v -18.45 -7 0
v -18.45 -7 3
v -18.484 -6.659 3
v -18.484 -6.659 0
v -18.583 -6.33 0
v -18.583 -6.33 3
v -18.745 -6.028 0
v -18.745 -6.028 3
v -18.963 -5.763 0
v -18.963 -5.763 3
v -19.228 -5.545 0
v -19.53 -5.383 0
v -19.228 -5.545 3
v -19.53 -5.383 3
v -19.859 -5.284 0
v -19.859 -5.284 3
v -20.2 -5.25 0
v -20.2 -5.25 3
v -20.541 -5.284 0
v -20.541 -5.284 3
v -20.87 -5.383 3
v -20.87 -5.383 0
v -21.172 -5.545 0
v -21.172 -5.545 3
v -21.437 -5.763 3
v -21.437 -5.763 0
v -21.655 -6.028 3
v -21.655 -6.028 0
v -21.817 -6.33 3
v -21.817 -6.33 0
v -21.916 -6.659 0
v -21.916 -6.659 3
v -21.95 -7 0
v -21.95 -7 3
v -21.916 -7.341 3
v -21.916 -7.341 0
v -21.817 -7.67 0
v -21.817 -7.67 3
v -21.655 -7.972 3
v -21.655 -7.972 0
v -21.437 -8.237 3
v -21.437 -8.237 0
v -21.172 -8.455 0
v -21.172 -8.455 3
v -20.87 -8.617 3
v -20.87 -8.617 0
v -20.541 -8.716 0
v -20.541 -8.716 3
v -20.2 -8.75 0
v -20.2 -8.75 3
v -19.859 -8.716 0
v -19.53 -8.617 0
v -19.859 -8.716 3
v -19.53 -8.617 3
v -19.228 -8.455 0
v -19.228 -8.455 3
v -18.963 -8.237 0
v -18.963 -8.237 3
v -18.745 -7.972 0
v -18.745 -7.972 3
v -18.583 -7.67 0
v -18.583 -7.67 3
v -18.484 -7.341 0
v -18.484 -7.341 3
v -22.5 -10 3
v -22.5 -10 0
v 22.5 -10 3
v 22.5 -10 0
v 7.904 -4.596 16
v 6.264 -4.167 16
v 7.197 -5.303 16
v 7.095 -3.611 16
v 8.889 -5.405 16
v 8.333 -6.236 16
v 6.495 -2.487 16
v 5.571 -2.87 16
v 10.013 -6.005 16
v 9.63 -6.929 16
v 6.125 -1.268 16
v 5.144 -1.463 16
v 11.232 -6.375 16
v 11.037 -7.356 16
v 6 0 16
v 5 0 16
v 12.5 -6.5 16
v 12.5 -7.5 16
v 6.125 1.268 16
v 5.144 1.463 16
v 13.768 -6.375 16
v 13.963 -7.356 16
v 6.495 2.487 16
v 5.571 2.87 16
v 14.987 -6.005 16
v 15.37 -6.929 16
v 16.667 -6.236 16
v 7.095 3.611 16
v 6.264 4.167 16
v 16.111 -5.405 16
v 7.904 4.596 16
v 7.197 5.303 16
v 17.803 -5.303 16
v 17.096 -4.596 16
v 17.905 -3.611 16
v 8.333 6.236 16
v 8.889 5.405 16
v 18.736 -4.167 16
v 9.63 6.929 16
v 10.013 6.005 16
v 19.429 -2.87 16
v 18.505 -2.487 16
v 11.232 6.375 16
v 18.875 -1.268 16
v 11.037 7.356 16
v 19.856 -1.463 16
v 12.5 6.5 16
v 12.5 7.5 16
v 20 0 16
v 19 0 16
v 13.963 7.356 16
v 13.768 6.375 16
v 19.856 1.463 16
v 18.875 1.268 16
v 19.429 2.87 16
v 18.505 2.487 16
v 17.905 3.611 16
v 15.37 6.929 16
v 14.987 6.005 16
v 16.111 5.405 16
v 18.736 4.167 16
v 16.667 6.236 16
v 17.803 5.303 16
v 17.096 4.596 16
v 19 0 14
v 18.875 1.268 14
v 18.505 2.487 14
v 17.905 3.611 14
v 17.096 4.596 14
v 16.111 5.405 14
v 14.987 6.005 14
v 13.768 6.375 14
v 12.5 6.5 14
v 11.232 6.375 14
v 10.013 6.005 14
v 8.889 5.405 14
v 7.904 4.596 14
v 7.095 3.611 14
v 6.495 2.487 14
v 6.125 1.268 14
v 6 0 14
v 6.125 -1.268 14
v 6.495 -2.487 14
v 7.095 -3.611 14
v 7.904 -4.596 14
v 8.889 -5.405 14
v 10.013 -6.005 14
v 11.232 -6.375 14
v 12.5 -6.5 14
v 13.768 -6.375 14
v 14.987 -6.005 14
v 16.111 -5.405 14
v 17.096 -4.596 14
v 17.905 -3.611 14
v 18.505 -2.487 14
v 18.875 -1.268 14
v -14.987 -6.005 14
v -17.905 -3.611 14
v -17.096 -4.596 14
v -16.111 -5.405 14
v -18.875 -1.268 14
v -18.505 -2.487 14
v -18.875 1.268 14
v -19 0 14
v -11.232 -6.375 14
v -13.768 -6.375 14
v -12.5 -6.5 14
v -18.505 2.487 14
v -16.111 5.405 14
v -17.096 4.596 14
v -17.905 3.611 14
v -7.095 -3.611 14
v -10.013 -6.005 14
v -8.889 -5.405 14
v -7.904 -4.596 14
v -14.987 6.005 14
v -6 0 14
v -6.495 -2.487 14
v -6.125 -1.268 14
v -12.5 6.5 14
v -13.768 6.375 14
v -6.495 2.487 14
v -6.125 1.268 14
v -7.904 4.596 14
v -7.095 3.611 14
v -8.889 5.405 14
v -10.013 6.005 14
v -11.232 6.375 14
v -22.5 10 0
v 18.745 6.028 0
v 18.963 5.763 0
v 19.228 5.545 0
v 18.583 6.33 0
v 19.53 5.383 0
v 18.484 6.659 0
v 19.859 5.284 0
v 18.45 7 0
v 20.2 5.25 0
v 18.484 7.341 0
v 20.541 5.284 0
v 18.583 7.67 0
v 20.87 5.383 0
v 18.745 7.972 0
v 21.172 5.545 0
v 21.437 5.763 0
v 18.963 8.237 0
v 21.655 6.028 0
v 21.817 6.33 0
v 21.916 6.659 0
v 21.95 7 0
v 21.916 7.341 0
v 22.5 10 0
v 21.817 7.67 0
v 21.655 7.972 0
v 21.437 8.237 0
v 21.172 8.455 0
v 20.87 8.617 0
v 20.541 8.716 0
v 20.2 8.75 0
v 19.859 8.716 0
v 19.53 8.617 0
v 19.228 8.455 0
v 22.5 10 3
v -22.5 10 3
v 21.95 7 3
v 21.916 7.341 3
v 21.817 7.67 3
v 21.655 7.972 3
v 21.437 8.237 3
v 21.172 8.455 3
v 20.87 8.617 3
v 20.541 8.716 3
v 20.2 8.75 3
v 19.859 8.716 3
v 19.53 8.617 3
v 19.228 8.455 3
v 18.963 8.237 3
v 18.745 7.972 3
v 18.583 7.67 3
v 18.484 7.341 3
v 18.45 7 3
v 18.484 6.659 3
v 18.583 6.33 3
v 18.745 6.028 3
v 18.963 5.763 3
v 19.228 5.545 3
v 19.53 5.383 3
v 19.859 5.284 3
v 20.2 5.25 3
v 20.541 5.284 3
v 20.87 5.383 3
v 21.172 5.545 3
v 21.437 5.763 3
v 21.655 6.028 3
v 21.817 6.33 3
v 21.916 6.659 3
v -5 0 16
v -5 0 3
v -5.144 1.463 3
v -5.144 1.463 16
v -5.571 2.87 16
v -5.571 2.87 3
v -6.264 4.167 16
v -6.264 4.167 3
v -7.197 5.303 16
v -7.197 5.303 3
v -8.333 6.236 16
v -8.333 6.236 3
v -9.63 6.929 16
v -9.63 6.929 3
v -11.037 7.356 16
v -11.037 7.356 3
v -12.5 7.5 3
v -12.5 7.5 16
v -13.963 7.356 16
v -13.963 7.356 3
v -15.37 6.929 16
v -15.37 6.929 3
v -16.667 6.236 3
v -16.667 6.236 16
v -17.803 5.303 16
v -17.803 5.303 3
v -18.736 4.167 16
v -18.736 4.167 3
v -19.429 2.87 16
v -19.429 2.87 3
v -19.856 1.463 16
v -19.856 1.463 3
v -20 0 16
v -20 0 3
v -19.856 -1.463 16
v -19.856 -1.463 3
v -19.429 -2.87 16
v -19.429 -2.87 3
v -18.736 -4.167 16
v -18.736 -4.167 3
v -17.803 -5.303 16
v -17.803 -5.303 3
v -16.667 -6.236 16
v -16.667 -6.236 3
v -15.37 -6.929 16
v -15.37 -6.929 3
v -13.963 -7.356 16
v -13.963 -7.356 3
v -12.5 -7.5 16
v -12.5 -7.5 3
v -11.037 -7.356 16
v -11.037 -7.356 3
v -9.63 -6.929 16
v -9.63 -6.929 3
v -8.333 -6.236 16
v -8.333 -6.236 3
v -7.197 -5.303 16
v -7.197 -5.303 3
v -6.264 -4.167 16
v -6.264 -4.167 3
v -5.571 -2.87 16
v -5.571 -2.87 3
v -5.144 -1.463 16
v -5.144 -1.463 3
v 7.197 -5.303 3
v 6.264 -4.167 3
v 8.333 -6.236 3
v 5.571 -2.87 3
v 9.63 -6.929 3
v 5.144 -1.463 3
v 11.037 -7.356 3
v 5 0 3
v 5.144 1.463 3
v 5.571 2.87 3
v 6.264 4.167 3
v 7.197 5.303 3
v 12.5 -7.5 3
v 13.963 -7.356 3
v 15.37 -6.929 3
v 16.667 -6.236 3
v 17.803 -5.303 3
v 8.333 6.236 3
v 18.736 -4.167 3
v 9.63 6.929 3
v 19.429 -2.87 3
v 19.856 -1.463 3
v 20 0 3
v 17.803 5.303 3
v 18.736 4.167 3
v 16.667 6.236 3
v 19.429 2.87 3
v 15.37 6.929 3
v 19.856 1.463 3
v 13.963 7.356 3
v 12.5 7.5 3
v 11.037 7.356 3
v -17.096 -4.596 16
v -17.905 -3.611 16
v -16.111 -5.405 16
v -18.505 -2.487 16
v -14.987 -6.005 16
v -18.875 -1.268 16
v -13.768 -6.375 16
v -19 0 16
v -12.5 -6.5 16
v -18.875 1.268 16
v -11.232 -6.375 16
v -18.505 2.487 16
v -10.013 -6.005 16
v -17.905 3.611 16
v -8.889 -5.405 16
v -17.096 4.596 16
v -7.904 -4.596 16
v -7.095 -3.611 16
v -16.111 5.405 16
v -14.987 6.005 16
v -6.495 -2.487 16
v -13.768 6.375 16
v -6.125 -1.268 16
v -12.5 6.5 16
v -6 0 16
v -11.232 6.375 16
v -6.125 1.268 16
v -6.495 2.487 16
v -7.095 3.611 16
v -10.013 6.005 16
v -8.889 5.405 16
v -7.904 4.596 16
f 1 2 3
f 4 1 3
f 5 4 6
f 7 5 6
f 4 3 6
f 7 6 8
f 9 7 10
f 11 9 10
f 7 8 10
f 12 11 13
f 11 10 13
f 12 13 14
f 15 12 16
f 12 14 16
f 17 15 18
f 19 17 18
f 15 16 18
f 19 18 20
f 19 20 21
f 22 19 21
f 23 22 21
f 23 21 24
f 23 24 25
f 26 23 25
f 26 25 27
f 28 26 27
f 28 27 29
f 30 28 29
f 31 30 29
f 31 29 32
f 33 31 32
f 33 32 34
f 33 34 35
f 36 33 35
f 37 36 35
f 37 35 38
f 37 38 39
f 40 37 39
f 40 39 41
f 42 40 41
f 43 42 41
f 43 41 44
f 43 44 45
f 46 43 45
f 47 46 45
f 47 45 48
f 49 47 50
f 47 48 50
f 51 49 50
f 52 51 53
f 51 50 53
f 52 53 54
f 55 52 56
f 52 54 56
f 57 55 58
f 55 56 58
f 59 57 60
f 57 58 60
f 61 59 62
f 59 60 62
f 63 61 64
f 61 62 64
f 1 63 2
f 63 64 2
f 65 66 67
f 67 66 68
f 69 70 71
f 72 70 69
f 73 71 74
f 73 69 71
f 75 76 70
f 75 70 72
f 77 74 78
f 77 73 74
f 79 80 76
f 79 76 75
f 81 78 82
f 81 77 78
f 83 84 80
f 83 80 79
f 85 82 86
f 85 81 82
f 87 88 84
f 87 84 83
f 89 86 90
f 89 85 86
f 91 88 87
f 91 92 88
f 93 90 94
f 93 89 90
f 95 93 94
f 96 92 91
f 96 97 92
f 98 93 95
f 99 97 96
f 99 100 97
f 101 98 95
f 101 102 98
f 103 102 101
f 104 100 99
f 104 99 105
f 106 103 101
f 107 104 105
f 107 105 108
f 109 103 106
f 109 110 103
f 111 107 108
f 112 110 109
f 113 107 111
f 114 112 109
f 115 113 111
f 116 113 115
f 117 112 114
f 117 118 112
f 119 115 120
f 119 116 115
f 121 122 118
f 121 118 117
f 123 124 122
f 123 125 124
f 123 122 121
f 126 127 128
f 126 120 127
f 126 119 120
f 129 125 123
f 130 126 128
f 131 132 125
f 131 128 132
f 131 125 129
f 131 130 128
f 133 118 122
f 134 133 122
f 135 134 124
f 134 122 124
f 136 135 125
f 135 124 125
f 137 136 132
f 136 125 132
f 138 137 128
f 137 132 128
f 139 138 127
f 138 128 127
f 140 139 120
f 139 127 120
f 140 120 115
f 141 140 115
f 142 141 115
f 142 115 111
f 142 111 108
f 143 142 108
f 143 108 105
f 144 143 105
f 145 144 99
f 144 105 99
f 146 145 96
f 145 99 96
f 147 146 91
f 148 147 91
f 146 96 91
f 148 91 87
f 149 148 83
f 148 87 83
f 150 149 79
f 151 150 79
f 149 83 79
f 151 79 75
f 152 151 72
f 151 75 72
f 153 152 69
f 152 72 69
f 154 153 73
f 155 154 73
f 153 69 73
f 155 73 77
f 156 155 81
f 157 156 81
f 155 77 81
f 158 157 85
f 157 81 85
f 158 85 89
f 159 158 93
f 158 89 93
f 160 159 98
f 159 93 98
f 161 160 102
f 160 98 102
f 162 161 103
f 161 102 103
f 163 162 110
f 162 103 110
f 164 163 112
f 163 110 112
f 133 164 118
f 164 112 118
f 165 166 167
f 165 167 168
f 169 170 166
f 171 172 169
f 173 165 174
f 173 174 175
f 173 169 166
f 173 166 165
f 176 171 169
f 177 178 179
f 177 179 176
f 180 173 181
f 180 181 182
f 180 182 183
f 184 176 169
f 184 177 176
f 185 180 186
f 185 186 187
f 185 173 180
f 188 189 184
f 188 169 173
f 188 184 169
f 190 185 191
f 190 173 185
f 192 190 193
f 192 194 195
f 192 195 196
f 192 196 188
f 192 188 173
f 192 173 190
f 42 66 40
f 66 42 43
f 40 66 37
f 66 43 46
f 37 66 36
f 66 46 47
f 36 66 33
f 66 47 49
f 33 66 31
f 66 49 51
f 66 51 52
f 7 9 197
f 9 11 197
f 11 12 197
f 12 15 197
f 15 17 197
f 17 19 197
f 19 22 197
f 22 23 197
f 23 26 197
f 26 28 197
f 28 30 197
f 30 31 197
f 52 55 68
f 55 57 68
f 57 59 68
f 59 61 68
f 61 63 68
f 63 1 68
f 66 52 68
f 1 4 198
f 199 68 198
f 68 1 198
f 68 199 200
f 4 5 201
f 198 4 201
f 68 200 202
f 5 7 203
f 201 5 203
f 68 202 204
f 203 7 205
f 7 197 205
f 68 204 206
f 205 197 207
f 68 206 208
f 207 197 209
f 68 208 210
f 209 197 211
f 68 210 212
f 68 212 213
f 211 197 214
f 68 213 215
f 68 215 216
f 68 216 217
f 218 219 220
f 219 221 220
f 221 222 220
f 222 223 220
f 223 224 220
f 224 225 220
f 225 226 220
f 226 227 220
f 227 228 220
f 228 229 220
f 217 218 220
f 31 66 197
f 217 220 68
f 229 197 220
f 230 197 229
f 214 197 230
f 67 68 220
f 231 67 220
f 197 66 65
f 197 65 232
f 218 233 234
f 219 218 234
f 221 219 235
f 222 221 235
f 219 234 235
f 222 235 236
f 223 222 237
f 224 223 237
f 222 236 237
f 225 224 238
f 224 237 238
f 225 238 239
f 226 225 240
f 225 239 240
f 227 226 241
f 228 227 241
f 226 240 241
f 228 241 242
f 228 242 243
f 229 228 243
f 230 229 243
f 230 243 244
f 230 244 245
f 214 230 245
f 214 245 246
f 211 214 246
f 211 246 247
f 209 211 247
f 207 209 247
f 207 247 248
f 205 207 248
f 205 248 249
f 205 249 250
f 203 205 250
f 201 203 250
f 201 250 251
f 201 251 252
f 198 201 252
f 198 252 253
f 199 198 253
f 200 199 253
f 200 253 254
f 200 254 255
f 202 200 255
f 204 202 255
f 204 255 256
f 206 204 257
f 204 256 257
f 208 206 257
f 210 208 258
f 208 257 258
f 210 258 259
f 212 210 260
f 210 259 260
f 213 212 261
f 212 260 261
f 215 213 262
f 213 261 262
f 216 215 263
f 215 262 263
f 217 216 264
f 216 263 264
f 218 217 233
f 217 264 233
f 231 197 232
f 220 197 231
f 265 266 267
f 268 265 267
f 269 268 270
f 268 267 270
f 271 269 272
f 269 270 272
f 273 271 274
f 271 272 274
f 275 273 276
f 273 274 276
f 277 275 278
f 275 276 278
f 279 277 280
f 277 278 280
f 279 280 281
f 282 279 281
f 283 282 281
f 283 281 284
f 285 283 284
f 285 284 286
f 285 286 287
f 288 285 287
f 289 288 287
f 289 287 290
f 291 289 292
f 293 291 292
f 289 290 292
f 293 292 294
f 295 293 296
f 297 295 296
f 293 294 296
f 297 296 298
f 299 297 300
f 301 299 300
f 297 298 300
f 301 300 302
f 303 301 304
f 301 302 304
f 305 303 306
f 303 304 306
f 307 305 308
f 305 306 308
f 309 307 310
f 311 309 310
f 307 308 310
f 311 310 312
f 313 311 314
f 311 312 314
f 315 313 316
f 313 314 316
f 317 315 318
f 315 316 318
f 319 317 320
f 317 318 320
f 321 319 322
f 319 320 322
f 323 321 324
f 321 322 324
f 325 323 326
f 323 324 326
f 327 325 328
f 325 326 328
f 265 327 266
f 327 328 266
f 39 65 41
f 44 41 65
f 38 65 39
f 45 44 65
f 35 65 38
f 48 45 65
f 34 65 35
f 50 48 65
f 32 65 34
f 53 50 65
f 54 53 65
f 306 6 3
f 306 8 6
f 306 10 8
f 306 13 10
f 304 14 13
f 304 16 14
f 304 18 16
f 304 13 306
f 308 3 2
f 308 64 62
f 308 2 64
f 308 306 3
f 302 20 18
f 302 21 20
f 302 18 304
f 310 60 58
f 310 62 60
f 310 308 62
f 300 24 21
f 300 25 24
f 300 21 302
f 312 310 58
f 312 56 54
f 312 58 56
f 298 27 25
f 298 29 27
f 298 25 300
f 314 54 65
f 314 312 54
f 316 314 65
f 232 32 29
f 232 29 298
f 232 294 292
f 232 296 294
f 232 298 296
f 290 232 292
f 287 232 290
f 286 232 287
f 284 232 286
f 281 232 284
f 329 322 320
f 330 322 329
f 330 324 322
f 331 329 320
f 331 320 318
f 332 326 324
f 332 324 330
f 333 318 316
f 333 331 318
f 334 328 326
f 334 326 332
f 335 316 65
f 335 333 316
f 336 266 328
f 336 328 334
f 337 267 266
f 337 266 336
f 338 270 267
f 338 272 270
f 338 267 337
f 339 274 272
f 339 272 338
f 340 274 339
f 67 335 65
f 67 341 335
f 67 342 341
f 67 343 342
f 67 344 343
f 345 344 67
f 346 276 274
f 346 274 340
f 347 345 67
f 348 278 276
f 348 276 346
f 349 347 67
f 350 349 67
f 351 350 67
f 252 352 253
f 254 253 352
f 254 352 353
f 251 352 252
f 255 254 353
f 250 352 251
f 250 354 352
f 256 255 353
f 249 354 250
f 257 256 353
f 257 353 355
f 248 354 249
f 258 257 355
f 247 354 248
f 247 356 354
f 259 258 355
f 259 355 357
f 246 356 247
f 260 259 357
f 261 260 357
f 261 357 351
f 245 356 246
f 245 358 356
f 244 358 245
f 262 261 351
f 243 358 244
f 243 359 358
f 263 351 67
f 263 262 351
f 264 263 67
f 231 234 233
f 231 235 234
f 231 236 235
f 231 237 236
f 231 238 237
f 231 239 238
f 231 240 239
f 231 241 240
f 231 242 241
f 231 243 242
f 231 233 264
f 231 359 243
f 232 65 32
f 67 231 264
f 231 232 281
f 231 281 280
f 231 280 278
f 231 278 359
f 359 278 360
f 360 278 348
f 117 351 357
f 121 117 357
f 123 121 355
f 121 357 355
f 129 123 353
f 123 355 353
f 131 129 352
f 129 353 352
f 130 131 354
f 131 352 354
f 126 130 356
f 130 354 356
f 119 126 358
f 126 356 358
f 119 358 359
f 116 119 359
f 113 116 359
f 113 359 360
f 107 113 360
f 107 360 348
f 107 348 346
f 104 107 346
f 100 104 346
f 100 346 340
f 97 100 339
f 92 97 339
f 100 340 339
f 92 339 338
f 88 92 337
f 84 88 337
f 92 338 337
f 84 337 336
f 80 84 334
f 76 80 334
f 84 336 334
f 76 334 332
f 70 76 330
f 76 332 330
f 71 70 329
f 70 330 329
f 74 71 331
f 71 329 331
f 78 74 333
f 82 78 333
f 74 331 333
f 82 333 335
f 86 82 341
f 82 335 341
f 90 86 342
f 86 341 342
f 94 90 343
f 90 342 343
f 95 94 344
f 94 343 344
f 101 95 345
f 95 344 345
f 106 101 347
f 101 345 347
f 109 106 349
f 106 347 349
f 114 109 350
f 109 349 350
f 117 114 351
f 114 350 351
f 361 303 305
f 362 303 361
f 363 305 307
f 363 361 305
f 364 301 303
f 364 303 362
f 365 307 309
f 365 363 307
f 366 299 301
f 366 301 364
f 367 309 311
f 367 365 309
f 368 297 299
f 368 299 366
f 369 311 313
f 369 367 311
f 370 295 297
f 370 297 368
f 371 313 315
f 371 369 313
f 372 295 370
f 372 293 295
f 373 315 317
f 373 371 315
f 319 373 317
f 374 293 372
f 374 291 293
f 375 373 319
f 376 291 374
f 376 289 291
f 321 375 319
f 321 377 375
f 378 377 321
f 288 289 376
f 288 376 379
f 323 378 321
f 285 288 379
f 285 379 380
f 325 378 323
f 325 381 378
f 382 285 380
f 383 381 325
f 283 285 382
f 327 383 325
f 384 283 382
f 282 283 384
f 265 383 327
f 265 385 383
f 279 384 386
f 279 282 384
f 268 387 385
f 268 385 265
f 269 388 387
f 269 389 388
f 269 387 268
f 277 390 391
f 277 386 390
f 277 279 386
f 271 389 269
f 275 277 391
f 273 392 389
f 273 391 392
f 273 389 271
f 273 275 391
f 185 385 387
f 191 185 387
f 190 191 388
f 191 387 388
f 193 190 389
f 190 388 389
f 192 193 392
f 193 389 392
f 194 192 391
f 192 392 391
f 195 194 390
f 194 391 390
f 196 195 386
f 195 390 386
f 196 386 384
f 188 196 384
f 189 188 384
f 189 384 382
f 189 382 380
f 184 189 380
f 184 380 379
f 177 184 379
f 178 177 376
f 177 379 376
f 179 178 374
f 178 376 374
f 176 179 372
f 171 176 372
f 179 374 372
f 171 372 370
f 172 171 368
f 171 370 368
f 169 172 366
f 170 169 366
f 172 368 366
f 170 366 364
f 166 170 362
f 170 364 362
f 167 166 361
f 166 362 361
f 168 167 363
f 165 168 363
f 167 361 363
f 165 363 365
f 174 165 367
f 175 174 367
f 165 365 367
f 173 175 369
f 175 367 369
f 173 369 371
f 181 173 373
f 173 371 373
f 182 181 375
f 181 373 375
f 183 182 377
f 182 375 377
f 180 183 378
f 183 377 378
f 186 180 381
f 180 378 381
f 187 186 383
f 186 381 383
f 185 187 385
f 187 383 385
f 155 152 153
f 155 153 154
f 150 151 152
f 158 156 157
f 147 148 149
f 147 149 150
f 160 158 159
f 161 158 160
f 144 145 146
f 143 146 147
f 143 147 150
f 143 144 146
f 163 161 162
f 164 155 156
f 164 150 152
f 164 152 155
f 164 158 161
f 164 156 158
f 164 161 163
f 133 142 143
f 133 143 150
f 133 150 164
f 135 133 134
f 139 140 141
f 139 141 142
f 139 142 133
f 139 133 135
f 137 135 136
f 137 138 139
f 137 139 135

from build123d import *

# Parameters (mm, degrees)
SKETCH_1_W               = 45
SKETCH_1_H               = 20
EXTRUDE_1_DEPTH          = 3
SKETCH_2_R               = 7.5
EXTRUDE_2_DEPTH          = 13
SKETCH_3_R               = 1.75
CUT_EXTRUDE_1_DEPTH      = 14
CUT_EXTRUDE_1_DEPTH_BACK = 4
SKETCH_4_R               = 6.5
CUT_EXTRUDE_2_DEPTH      = 2


with BuildPart() as part:
    # 草图1 → 凸台-拉伸1 (new body)
    with BuildSketch(Plane.XY):
        Rectangle(SKETCH_1_W, SKETCH_1_H)
    extrude(amount=EXTRUDE_1_DEPTH)

    # 草图2 → 凸台-拉伸2 (add)
    with BuildSketch(Plane.XY.offset(3)):
        with Locations((12.5, 0)):
            Circle(SKETCH_2_R)
        with Locations((-12.5, 0)):
            Circle(SKETCH_2_R)
    extrude(amount=EXTRUDE_2_DEPTH)

    # 草图3 → 切除-拉伸1 (cut, two sides)
    with BuildSketch(Plane.XY.offset(3)) as cut_extrude_1_sk:
        with Locations((20.2, 7)):
            Circle(SKETCH_3_R)
        with Locations((-20.2, -7)):
            Circle(SKETCH_3_R)
    extrude(amount=CUT_EXTRUDE_1_DEPTH, mode=Mode.SUBTRACT)
    extrude(cut_extrude_1_sk.sketch, amount=-CUT_EXTRUDE_1_DEPTH_BACK, mode=Mode.SUBTRACT)

    # 草图4 → 切除-拉伸2 (cut)
    with BuildSketch(Plane.XY.offset(16)):
        with Locations((-12.5, 0)):
            Circle(SKETCH_4_R)
        with Locations((12.5, 0)):
            Circle(SKETCH_4_R)
    extrude(amount=-CUT_EXTRUDE_2_DEPTH, mode=Mode.SUBTRACT)


solid = part.part
